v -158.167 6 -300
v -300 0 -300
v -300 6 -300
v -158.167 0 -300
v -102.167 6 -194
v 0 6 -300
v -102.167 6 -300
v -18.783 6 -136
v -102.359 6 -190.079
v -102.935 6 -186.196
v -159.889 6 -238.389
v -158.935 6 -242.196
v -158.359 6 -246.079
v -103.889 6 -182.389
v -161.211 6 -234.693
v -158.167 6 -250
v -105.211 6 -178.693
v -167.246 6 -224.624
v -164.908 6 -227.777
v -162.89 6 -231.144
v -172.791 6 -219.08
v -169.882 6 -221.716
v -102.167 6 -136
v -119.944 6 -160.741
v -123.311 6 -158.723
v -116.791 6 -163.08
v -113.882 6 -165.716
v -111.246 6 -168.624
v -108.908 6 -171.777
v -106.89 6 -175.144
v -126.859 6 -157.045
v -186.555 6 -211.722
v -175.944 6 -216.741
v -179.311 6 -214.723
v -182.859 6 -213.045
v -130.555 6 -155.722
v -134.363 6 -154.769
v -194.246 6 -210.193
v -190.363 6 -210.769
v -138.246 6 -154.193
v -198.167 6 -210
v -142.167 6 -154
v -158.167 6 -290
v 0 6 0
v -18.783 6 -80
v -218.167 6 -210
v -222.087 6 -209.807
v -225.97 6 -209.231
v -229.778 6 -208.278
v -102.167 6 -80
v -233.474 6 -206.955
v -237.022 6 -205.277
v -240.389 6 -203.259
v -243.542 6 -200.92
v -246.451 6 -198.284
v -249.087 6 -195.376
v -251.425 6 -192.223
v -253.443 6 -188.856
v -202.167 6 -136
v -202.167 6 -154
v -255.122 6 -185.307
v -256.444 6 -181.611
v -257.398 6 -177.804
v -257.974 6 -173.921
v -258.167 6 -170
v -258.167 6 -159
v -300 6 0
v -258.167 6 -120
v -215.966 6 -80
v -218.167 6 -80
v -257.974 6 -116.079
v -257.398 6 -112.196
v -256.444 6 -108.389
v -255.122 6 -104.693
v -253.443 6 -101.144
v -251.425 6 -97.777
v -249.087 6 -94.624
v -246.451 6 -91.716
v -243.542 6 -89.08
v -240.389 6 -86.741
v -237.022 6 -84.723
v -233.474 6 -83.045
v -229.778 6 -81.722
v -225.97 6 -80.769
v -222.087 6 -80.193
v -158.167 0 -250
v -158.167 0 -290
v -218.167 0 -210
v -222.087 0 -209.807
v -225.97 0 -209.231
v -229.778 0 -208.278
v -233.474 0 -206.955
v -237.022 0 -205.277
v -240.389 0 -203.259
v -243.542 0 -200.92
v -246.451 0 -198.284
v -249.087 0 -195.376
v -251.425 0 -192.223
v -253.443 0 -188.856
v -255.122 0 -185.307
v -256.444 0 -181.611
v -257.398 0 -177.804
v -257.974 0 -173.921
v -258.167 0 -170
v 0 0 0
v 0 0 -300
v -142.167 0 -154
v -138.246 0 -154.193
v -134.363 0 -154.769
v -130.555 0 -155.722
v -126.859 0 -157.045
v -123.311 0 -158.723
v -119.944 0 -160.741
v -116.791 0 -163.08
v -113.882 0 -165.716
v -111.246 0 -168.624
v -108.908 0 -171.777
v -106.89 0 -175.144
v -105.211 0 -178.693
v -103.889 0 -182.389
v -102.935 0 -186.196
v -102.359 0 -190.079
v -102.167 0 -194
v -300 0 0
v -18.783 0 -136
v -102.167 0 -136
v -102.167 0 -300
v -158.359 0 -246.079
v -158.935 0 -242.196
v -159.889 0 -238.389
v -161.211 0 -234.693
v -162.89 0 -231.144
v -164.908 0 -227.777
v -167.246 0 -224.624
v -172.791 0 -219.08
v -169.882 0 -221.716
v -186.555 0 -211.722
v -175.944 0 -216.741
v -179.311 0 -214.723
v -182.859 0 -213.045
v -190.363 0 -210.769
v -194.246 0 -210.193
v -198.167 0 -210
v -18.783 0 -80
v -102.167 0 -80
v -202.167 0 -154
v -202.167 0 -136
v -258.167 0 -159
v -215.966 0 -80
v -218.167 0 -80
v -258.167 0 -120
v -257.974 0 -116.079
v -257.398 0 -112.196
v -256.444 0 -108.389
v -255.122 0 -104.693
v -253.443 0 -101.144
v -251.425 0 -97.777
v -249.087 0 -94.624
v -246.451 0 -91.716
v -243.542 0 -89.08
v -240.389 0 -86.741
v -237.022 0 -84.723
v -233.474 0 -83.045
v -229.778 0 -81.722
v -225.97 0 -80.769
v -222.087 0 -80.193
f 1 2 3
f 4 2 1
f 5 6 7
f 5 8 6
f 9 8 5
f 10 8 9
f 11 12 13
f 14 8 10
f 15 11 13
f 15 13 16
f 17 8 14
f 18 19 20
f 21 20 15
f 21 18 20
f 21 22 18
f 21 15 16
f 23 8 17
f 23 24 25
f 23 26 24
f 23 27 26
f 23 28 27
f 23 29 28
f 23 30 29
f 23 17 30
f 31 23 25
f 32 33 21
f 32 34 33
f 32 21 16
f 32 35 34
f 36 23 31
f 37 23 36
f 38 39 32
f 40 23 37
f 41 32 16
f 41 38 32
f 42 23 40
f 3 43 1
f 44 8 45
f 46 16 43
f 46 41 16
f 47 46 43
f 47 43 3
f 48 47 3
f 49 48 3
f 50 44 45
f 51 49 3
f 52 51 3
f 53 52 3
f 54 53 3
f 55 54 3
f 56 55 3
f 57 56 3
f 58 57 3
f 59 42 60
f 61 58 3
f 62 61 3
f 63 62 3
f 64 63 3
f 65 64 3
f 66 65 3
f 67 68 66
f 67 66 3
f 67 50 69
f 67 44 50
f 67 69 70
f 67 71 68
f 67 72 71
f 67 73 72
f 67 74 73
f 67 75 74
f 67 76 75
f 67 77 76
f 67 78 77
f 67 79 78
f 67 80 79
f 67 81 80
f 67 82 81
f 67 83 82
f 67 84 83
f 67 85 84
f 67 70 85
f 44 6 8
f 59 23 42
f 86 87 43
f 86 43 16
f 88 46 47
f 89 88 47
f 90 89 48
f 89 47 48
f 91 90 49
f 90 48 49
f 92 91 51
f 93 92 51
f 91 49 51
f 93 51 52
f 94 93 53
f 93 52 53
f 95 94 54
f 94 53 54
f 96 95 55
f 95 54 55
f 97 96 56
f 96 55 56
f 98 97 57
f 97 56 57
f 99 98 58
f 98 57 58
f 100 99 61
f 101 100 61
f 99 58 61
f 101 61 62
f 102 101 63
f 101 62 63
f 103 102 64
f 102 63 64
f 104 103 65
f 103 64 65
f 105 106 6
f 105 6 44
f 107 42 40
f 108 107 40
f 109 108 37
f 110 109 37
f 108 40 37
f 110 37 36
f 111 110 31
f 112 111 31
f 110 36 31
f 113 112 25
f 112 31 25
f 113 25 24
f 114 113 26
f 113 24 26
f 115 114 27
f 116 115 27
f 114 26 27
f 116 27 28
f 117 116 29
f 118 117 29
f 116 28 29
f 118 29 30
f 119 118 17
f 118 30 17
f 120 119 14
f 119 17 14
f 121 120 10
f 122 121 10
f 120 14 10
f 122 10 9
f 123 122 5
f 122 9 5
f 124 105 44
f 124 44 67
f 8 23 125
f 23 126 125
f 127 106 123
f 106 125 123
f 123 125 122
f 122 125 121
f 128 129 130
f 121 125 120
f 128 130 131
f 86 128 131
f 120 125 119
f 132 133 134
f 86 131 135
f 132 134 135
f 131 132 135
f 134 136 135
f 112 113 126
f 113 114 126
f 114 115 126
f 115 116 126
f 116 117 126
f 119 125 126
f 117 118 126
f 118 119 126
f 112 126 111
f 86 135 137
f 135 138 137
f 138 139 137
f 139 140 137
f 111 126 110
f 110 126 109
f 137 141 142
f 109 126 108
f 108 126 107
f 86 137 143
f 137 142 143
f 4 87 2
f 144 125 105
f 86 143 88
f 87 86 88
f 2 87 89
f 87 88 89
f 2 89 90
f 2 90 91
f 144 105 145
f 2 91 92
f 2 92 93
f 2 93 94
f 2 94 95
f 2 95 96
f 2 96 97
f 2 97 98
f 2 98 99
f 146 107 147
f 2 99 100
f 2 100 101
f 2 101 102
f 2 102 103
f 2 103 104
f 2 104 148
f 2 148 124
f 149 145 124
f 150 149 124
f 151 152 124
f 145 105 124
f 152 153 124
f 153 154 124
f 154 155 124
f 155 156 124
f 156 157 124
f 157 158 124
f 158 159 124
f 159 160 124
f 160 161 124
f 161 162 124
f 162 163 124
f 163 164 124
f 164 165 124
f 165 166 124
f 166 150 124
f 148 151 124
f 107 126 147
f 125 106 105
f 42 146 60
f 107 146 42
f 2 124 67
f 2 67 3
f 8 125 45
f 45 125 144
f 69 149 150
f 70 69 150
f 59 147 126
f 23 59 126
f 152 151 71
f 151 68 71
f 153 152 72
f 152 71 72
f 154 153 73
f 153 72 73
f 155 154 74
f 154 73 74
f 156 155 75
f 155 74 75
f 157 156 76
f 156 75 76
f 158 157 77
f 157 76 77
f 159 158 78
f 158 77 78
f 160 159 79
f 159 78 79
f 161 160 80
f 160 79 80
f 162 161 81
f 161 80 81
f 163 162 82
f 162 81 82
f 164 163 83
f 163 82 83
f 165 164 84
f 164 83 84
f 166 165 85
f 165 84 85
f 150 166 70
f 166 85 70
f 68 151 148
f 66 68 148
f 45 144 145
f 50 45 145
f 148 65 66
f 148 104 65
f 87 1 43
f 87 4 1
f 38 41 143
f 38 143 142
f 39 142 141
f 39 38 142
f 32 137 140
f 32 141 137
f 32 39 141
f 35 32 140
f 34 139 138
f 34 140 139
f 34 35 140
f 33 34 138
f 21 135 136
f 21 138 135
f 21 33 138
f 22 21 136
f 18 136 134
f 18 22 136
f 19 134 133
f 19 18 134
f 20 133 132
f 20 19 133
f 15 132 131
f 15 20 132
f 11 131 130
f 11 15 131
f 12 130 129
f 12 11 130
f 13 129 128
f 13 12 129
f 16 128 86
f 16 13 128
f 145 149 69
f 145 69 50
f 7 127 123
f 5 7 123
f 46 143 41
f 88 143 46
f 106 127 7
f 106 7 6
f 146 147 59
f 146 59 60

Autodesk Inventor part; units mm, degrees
ref_plane "YZ Plane" through (0, 0, 0) normal (1, 0, 0) x (0, 1, 0)
ref_plane "XZ Plane" through (0, 0, 0) normal (0, 1, 0) x (-1, 0, 0)
ref_plane "XY Plane" through (0, 0, 0) normal (0, 0, 1) x (1, 0, 0)
sketch "Esquisse1" plane through (0, 0, 0) normal (0, 1, 0) x (-1, 0, 0)
  line L0 (0, 0) -> (300, 0)
  line L1 (300, 0) -> (300, -300)
  line L2 (300, -300) -> (0, -300)
  line L3 (0, -300) -> (0, 0)
  line L4 (158.1666, -300) -> (158.1666, -290)
  line L5 (158.1666, -290) -> (158.1666, -210)
  line L6 (158.1666, -210) -> (258.1666, -210)
  line L7 (258.1666, -210) -> (258.1666, -159)
  line L8 (202.1666, -154) -> (102.1666, -154)
  line L9 (158.1666, -300) -> (102.1666, -300)
  line L10 (102.1666, -300) -> (102.1666, -154)
  line L11 (202.1666, -136) -> (102.1666, -136)
  line L12 (215.9662, -80) -> (258.1666, -80)
  line L13 (258.1666, -80) -> (258.1666, -159)
  line L14 (215.9662, -80) -> (102.1666, -80)
  line L15 (202.1666, -136) -> (202.1666, -154)
  line L16 (102.1666, -136) -> (18.7834, -136)
  line L17 (18.7834, -136) -> (18.7834, -80)
  line L18 (18.7834, -80) -> (102.1666, -80)
  dimension "d0" = 300
  dimension "d1" = 300
  dimension "d4" = 100
  dimension "d7" = 56
  dimension "d13" = 146
  dimension "d14" = 100
  dimension "d15" = 130
  dimension "d17" = 56
  dimension "d18" = 90
extrude "Extrusion2" add sketch "Esquisse1" along normal blind 6 contours L0 L1 L2 L4 L5 L6 L7 L13 L12 L14 L18 L17 L16 L11 L15 L8 L10 L3
fillet "Congé1" radius 40 4 edges at (-102.1666, 3, -154) (-158.1666, 3, -210) (-258.1666, 3, -210) (-258.1666, 3, -80)
properties part number "Plaque vois"
